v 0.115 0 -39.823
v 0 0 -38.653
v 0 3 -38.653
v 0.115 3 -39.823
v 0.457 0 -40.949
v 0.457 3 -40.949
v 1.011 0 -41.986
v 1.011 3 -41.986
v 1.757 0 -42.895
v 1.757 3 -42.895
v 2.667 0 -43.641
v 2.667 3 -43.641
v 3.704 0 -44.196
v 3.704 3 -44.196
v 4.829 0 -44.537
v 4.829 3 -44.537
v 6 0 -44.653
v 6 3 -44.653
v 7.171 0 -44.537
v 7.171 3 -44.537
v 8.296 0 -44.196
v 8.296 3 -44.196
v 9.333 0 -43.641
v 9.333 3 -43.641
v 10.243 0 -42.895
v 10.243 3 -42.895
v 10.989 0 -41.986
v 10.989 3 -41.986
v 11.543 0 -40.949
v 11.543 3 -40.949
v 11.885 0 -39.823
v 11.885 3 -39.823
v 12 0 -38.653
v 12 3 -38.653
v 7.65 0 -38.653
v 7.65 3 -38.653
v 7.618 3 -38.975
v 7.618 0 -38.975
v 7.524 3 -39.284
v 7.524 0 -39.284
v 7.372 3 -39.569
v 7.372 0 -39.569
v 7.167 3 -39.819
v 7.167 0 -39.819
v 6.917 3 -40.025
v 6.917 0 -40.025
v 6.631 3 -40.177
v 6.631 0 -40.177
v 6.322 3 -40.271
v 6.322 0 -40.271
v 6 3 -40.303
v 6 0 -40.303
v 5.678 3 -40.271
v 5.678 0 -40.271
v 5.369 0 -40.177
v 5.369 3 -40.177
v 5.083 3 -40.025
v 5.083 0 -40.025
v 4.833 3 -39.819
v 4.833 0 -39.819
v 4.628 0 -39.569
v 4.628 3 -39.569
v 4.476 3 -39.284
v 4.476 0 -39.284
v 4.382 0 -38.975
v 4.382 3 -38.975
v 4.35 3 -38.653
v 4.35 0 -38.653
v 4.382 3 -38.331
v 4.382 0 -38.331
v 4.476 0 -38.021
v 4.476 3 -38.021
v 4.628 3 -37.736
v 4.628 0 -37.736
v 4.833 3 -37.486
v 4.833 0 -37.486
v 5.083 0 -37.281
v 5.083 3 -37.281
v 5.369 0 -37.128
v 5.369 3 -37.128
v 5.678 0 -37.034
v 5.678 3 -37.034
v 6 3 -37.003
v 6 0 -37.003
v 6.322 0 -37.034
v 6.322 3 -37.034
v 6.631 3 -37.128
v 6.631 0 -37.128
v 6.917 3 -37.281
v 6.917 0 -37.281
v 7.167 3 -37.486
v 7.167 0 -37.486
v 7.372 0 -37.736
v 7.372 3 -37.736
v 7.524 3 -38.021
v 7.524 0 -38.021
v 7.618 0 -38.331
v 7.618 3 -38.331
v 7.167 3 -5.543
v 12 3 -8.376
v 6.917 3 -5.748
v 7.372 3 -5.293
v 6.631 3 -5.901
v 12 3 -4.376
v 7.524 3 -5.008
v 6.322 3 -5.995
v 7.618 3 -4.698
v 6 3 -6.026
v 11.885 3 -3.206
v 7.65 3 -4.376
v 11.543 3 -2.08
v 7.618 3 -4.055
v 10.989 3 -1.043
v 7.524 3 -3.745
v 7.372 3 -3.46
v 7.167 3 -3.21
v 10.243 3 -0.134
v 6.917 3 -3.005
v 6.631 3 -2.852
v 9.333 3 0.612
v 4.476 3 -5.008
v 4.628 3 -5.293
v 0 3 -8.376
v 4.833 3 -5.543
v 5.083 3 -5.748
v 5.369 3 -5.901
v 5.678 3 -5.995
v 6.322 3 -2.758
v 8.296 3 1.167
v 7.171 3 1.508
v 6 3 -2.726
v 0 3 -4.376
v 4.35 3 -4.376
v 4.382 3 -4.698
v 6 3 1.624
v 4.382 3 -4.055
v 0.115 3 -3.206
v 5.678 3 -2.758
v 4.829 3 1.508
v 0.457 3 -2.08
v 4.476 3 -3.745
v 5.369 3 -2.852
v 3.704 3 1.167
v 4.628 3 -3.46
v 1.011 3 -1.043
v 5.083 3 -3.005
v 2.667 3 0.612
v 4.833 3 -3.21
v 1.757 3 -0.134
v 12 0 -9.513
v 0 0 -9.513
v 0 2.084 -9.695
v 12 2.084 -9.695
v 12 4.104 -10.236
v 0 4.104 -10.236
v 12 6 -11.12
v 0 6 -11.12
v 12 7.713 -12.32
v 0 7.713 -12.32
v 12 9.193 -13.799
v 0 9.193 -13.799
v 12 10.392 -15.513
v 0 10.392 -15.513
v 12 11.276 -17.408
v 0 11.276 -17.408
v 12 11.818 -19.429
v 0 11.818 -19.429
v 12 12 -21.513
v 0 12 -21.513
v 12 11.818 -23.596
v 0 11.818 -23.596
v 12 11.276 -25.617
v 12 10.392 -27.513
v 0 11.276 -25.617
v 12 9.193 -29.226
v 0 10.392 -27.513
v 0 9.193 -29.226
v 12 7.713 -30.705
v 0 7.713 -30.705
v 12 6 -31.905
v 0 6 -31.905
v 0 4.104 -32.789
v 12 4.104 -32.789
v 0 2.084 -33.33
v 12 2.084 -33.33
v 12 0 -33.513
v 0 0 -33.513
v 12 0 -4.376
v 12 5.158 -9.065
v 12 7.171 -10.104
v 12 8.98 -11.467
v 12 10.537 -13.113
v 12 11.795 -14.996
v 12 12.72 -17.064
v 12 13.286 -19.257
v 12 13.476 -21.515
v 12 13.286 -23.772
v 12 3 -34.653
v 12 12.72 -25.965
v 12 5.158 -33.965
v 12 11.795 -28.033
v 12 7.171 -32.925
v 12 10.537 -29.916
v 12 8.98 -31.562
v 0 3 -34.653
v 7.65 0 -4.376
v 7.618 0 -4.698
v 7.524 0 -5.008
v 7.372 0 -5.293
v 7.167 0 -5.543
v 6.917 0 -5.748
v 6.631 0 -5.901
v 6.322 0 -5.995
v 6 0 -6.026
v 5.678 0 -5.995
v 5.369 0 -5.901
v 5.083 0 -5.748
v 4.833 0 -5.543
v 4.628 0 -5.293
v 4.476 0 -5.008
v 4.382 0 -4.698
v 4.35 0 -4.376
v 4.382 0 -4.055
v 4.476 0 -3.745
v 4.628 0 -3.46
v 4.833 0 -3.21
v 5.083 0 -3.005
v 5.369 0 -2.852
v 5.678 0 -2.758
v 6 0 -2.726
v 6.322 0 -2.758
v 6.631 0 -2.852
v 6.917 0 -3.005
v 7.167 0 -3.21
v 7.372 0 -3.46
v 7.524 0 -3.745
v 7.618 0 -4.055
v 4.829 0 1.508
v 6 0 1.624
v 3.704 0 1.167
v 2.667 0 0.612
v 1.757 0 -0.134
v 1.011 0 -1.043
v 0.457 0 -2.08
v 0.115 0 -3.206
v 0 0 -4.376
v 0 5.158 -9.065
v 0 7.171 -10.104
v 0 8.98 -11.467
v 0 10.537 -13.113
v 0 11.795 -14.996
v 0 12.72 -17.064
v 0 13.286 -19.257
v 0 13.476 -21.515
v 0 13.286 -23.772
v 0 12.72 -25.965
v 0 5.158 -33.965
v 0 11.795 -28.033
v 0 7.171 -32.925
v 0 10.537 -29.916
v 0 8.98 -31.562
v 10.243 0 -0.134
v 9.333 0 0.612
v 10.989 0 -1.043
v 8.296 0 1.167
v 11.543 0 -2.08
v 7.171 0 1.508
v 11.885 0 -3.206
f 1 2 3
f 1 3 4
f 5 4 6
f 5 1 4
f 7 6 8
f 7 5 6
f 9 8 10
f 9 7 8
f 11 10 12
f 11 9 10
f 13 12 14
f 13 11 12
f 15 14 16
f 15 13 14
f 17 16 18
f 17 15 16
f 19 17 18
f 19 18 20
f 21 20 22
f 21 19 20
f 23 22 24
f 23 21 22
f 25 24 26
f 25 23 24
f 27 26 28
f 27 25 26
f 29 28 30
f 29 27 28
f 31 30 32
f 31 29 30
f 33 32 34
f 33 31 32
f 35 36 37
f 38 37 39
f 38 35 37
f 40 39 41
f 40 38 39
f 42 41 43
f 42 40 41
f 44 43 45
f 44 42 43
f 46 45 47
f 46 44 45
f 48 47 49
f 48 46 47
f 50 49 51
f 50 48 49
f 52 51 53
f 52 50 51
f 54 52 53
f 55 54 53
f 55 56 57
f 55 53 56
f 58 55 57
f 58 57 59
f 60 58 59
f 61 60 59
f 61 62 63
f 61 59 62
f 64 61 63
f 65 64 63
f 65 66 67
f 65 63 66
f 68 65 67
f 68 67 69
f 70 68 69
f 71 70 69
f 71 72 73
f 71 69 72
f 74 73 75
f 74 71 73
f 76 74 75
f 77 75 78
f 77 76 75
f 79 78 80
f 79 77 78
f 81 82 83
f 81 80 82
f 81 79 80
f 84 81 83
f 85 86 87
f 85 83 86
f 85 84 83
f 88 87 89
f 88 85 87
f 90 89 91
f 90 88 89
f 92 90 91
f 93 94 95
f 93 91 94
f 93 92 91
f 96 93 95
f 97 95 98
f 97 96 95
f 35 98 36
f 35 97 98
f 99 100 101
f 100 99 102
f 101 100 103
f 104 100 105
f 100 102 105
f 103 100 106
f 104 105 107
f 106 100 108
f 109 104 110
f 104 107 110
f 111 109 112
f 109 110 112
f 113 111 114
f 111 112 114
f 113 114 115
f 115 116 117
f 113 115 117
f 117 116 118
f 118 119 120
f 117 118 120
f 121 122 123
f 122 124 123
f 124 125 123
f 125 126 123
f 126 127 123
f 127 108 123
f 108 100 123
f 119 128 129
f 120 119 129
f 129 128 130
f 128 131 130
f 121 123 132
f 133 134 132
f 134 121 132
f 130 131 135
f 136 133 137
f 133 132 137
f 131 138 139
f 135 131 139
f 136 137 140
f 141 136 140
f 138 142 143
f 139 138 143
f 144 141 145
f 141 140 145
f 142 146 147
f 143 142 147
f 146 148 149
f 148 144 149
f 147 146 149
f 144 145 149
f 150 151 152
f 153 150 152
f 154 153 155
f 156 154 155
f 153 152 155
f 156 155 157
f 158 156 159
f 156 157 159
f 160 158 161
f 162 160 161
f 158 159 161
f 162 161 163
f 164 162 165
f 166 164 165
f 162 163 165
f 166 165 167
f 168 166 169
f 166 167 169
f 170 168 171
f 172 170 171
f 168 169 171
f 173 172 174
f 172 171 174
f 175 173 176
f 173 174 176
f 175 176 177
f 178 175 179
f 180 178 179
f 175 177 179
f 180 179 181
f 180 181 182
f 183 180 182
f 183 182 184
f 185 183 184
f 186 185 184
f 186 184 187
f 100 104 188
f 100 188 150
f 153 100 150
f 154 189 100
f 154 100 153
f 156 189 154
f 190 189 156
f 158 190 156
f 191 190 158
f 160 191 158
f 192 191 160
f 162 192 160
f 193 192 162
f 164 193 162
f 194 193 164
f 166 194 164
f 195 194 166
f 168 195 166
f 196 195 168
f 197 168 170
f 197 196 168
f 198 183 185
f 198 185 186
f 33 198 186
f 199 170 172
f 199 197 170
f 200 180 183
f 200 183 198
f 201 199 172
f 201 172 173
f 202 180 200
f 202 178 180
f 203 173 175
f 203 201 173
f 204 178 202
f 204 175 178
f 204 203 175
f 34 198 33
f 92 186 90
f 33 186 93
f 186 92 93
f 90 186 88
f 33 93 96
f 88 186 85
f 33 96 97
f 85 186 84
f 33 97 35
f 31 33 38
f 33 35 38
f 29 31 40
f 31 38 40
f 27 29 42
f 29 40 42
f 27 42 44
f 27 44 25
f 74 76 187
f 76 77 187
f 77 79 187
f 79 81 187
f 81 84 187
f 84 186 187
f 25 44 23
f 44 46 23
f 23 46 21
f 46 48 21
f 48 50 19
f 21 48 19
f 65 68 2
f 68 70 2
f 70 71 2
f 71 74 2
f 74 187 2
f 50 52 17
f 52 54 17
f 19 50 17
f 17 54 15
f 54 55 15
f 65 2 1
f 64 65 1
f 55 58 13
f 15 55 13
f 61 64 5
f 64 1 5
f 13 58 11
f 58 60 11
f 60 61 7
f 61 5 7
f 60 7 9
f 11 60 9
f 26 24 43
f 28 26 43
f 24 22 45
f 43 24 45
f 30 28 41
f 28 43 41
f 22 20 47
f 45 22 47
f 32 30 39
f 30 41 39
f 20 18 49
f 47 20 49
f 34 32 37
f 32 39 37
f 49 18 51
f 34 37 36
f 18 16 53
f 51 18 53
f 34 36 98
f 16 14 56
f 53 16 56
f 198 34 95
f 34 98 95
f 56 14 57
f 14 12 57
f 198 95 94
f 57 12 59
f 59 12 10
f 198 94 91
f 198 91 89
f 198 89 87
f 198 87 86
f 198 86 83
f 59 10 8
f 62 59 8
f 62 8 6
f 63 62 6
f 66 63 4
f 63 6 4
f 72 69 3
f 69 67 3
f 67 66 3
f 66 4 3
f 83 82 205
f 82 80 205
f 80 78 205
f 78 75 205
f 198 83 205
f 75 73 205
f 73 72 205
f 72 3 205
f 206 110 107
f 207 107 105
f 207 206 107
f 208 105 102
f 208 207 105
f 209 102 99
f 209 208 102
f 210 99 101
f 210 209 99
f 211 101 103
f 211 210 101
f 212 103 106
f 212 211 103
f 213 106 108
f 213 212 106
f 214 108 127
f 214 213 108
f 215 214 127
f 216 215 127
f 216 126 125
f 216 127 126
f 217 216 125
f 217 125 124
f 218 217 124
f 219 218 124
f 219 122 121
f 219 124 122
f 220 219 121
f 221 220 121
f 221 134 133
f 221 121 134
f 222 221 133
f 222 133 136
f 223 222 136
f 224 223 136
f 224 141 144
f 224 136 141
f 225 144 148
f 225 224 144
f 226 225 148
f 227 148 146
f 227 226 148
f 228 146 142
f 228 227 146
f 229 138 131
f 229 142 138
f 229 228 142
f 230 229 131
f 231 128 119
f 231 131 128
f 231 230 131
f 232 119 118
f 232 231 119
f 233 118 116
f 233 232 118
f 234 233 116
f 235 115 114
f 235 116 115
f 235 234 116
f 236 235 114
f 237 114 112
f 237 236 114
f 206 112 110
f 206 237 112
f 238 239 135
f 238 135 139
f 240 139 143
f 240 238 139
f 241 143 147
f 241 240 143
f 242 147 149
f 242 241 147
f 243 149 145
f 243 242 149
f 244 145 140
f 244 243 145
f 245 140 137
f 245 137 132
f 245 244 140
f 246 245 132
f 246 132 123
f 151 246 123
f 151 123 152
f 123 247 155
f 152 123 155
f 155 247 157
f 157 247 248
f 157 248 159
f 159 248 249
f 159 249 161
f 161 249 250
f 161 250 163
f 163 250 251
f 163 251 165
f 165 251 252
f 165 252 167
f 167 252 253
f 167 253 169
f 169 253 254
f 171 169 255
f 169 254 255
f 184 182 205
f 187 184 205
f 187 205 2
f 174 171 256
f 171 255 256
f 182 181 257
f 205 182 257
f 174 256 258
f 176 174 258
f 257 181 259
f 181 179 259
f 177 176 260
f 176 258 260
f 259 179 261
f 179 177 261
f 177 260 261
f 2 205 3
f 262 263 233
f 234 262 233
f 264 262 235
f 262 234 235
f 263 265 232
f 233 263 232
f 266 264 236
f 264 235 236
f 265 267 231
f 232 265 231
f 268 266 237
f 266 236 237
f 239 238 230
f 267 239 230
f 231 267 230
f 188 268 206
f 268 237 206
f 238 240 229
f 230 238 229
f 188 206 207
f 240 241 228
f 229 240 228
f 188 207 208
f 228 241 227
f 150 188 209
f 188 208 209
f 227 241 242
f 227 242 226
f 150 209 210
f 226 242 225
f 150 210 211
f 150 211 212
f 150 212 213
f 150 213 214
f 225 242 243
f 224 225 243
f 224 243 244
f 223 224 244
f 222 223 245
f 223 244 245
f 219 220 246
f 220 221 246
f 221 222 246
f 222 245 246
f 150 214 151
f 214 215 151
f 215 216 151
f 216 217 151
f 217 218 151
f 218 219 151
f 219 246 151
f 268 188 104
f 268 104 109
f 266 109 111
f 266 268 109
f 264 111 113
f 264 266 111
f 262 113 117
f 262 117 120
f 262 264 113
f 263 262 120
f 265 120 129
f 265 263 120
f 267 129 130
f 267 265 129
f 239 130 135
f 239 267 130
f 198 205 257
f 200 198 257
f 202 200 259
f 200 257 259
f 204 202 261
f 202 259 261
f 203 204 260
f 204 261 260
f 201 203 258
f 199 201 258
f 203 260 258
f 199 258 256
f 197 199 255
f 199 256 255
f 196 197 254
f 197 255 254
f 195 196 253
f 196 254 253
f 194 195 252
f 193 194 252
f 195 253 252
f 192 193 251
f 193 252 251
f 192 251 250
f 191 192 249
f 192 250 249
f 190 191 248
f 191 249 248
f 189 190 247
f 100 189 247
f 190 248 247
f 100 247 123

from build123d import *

# Parameters (mm, degrees)
BOSS_EXTRUDE1_DEPTH = 12
SKETCH2_R           = 1.65
CUT_EXTRUDE2_DEPTH  = 14.476258968


with BuildPart() as part:
    # Sketch1 → Boss-Extrude1 (new body)
    with BuildSketch(Plane(origin=(0, 0, 0), x_dir=(0, 0, -1), z_dir=(1, 0, 0))):
        with BuildLine():
            Line((-1.623568234, 0), (9.512622948, 0))
            ThreePointArc((9.512622948, 0), (21.512622948, 12), (33.512622948, 0))
            Line((33.512622948, 0), (44.652622948, 0))
            Line((44.652622948, 0), (44.652622948, 3))
            Line((44.652622948, 3), (34.652622948, 3))
            ThreePointArc((34.652622948, 3), (21.514527357, 13.476258968), (8.376431766, 3))
            Line((8.376431766, 3), (-1.623568234, 3))
            Line((-1.623568234, 3), (-1.623568234, 0))
        make_face()
    extrude(amount=BOSS_EXTRUDE1_DEPTH)

    # Sketch2 → Cut-Extrude2 (cut, through all)
    with BuildSketch(Plane(origin=(0, 0, 0), x_dir=(1, 0, 0), z_dir=(0, 1, 0))):
        with BuildLine():
            Line((0, 44.652622948), (0, 38.652622948))
            ThreePointArc((0, 38.652622948), (1.757359313, 42.895263636), (6, 44.652622948))
            Line((6, 44.652622948), (0, 44.652622948))
        make_face()
        with BuildLine():
            Line((12, 44.652622948), (6, 44.652622948))
            ThreePointArc((6, 44.652622948), (10.242640687, 42.895263636), (12, 38.652622948))
            Line((12, 38.652622948), (12, 44.652622948))
        make_face()
        with BuildLine():
            Line((12, -1.623568234), (12, 4.376431766))
            ThreePointArc((12, 4.376431766), (10.242640687, 0.133791079), (6, -1.623568234))
            Line((6, -1.623568234), (12, -1.623568234))
        make_face()
        with BuildLine():
            Line((0, -1.623568234), (6, -1.623568234))
            ThreePointArc((6, -1.623568234), (1.757359313, 0.133791079), (0, 4.376431766))
            Line((0, 4.376431766), (0, -1.623568234))
        make_face()
        with Locations((6, 4.376431766)):
            Circle(SKETCH2_R)
        with Locations((6, 38.652622948)):
            Circle(SKETCH2_R)
    extrude(amount=CUT_EXTRUDE2_DEPTH, mode=Mode.SUBTRACT)


solid = part.part
